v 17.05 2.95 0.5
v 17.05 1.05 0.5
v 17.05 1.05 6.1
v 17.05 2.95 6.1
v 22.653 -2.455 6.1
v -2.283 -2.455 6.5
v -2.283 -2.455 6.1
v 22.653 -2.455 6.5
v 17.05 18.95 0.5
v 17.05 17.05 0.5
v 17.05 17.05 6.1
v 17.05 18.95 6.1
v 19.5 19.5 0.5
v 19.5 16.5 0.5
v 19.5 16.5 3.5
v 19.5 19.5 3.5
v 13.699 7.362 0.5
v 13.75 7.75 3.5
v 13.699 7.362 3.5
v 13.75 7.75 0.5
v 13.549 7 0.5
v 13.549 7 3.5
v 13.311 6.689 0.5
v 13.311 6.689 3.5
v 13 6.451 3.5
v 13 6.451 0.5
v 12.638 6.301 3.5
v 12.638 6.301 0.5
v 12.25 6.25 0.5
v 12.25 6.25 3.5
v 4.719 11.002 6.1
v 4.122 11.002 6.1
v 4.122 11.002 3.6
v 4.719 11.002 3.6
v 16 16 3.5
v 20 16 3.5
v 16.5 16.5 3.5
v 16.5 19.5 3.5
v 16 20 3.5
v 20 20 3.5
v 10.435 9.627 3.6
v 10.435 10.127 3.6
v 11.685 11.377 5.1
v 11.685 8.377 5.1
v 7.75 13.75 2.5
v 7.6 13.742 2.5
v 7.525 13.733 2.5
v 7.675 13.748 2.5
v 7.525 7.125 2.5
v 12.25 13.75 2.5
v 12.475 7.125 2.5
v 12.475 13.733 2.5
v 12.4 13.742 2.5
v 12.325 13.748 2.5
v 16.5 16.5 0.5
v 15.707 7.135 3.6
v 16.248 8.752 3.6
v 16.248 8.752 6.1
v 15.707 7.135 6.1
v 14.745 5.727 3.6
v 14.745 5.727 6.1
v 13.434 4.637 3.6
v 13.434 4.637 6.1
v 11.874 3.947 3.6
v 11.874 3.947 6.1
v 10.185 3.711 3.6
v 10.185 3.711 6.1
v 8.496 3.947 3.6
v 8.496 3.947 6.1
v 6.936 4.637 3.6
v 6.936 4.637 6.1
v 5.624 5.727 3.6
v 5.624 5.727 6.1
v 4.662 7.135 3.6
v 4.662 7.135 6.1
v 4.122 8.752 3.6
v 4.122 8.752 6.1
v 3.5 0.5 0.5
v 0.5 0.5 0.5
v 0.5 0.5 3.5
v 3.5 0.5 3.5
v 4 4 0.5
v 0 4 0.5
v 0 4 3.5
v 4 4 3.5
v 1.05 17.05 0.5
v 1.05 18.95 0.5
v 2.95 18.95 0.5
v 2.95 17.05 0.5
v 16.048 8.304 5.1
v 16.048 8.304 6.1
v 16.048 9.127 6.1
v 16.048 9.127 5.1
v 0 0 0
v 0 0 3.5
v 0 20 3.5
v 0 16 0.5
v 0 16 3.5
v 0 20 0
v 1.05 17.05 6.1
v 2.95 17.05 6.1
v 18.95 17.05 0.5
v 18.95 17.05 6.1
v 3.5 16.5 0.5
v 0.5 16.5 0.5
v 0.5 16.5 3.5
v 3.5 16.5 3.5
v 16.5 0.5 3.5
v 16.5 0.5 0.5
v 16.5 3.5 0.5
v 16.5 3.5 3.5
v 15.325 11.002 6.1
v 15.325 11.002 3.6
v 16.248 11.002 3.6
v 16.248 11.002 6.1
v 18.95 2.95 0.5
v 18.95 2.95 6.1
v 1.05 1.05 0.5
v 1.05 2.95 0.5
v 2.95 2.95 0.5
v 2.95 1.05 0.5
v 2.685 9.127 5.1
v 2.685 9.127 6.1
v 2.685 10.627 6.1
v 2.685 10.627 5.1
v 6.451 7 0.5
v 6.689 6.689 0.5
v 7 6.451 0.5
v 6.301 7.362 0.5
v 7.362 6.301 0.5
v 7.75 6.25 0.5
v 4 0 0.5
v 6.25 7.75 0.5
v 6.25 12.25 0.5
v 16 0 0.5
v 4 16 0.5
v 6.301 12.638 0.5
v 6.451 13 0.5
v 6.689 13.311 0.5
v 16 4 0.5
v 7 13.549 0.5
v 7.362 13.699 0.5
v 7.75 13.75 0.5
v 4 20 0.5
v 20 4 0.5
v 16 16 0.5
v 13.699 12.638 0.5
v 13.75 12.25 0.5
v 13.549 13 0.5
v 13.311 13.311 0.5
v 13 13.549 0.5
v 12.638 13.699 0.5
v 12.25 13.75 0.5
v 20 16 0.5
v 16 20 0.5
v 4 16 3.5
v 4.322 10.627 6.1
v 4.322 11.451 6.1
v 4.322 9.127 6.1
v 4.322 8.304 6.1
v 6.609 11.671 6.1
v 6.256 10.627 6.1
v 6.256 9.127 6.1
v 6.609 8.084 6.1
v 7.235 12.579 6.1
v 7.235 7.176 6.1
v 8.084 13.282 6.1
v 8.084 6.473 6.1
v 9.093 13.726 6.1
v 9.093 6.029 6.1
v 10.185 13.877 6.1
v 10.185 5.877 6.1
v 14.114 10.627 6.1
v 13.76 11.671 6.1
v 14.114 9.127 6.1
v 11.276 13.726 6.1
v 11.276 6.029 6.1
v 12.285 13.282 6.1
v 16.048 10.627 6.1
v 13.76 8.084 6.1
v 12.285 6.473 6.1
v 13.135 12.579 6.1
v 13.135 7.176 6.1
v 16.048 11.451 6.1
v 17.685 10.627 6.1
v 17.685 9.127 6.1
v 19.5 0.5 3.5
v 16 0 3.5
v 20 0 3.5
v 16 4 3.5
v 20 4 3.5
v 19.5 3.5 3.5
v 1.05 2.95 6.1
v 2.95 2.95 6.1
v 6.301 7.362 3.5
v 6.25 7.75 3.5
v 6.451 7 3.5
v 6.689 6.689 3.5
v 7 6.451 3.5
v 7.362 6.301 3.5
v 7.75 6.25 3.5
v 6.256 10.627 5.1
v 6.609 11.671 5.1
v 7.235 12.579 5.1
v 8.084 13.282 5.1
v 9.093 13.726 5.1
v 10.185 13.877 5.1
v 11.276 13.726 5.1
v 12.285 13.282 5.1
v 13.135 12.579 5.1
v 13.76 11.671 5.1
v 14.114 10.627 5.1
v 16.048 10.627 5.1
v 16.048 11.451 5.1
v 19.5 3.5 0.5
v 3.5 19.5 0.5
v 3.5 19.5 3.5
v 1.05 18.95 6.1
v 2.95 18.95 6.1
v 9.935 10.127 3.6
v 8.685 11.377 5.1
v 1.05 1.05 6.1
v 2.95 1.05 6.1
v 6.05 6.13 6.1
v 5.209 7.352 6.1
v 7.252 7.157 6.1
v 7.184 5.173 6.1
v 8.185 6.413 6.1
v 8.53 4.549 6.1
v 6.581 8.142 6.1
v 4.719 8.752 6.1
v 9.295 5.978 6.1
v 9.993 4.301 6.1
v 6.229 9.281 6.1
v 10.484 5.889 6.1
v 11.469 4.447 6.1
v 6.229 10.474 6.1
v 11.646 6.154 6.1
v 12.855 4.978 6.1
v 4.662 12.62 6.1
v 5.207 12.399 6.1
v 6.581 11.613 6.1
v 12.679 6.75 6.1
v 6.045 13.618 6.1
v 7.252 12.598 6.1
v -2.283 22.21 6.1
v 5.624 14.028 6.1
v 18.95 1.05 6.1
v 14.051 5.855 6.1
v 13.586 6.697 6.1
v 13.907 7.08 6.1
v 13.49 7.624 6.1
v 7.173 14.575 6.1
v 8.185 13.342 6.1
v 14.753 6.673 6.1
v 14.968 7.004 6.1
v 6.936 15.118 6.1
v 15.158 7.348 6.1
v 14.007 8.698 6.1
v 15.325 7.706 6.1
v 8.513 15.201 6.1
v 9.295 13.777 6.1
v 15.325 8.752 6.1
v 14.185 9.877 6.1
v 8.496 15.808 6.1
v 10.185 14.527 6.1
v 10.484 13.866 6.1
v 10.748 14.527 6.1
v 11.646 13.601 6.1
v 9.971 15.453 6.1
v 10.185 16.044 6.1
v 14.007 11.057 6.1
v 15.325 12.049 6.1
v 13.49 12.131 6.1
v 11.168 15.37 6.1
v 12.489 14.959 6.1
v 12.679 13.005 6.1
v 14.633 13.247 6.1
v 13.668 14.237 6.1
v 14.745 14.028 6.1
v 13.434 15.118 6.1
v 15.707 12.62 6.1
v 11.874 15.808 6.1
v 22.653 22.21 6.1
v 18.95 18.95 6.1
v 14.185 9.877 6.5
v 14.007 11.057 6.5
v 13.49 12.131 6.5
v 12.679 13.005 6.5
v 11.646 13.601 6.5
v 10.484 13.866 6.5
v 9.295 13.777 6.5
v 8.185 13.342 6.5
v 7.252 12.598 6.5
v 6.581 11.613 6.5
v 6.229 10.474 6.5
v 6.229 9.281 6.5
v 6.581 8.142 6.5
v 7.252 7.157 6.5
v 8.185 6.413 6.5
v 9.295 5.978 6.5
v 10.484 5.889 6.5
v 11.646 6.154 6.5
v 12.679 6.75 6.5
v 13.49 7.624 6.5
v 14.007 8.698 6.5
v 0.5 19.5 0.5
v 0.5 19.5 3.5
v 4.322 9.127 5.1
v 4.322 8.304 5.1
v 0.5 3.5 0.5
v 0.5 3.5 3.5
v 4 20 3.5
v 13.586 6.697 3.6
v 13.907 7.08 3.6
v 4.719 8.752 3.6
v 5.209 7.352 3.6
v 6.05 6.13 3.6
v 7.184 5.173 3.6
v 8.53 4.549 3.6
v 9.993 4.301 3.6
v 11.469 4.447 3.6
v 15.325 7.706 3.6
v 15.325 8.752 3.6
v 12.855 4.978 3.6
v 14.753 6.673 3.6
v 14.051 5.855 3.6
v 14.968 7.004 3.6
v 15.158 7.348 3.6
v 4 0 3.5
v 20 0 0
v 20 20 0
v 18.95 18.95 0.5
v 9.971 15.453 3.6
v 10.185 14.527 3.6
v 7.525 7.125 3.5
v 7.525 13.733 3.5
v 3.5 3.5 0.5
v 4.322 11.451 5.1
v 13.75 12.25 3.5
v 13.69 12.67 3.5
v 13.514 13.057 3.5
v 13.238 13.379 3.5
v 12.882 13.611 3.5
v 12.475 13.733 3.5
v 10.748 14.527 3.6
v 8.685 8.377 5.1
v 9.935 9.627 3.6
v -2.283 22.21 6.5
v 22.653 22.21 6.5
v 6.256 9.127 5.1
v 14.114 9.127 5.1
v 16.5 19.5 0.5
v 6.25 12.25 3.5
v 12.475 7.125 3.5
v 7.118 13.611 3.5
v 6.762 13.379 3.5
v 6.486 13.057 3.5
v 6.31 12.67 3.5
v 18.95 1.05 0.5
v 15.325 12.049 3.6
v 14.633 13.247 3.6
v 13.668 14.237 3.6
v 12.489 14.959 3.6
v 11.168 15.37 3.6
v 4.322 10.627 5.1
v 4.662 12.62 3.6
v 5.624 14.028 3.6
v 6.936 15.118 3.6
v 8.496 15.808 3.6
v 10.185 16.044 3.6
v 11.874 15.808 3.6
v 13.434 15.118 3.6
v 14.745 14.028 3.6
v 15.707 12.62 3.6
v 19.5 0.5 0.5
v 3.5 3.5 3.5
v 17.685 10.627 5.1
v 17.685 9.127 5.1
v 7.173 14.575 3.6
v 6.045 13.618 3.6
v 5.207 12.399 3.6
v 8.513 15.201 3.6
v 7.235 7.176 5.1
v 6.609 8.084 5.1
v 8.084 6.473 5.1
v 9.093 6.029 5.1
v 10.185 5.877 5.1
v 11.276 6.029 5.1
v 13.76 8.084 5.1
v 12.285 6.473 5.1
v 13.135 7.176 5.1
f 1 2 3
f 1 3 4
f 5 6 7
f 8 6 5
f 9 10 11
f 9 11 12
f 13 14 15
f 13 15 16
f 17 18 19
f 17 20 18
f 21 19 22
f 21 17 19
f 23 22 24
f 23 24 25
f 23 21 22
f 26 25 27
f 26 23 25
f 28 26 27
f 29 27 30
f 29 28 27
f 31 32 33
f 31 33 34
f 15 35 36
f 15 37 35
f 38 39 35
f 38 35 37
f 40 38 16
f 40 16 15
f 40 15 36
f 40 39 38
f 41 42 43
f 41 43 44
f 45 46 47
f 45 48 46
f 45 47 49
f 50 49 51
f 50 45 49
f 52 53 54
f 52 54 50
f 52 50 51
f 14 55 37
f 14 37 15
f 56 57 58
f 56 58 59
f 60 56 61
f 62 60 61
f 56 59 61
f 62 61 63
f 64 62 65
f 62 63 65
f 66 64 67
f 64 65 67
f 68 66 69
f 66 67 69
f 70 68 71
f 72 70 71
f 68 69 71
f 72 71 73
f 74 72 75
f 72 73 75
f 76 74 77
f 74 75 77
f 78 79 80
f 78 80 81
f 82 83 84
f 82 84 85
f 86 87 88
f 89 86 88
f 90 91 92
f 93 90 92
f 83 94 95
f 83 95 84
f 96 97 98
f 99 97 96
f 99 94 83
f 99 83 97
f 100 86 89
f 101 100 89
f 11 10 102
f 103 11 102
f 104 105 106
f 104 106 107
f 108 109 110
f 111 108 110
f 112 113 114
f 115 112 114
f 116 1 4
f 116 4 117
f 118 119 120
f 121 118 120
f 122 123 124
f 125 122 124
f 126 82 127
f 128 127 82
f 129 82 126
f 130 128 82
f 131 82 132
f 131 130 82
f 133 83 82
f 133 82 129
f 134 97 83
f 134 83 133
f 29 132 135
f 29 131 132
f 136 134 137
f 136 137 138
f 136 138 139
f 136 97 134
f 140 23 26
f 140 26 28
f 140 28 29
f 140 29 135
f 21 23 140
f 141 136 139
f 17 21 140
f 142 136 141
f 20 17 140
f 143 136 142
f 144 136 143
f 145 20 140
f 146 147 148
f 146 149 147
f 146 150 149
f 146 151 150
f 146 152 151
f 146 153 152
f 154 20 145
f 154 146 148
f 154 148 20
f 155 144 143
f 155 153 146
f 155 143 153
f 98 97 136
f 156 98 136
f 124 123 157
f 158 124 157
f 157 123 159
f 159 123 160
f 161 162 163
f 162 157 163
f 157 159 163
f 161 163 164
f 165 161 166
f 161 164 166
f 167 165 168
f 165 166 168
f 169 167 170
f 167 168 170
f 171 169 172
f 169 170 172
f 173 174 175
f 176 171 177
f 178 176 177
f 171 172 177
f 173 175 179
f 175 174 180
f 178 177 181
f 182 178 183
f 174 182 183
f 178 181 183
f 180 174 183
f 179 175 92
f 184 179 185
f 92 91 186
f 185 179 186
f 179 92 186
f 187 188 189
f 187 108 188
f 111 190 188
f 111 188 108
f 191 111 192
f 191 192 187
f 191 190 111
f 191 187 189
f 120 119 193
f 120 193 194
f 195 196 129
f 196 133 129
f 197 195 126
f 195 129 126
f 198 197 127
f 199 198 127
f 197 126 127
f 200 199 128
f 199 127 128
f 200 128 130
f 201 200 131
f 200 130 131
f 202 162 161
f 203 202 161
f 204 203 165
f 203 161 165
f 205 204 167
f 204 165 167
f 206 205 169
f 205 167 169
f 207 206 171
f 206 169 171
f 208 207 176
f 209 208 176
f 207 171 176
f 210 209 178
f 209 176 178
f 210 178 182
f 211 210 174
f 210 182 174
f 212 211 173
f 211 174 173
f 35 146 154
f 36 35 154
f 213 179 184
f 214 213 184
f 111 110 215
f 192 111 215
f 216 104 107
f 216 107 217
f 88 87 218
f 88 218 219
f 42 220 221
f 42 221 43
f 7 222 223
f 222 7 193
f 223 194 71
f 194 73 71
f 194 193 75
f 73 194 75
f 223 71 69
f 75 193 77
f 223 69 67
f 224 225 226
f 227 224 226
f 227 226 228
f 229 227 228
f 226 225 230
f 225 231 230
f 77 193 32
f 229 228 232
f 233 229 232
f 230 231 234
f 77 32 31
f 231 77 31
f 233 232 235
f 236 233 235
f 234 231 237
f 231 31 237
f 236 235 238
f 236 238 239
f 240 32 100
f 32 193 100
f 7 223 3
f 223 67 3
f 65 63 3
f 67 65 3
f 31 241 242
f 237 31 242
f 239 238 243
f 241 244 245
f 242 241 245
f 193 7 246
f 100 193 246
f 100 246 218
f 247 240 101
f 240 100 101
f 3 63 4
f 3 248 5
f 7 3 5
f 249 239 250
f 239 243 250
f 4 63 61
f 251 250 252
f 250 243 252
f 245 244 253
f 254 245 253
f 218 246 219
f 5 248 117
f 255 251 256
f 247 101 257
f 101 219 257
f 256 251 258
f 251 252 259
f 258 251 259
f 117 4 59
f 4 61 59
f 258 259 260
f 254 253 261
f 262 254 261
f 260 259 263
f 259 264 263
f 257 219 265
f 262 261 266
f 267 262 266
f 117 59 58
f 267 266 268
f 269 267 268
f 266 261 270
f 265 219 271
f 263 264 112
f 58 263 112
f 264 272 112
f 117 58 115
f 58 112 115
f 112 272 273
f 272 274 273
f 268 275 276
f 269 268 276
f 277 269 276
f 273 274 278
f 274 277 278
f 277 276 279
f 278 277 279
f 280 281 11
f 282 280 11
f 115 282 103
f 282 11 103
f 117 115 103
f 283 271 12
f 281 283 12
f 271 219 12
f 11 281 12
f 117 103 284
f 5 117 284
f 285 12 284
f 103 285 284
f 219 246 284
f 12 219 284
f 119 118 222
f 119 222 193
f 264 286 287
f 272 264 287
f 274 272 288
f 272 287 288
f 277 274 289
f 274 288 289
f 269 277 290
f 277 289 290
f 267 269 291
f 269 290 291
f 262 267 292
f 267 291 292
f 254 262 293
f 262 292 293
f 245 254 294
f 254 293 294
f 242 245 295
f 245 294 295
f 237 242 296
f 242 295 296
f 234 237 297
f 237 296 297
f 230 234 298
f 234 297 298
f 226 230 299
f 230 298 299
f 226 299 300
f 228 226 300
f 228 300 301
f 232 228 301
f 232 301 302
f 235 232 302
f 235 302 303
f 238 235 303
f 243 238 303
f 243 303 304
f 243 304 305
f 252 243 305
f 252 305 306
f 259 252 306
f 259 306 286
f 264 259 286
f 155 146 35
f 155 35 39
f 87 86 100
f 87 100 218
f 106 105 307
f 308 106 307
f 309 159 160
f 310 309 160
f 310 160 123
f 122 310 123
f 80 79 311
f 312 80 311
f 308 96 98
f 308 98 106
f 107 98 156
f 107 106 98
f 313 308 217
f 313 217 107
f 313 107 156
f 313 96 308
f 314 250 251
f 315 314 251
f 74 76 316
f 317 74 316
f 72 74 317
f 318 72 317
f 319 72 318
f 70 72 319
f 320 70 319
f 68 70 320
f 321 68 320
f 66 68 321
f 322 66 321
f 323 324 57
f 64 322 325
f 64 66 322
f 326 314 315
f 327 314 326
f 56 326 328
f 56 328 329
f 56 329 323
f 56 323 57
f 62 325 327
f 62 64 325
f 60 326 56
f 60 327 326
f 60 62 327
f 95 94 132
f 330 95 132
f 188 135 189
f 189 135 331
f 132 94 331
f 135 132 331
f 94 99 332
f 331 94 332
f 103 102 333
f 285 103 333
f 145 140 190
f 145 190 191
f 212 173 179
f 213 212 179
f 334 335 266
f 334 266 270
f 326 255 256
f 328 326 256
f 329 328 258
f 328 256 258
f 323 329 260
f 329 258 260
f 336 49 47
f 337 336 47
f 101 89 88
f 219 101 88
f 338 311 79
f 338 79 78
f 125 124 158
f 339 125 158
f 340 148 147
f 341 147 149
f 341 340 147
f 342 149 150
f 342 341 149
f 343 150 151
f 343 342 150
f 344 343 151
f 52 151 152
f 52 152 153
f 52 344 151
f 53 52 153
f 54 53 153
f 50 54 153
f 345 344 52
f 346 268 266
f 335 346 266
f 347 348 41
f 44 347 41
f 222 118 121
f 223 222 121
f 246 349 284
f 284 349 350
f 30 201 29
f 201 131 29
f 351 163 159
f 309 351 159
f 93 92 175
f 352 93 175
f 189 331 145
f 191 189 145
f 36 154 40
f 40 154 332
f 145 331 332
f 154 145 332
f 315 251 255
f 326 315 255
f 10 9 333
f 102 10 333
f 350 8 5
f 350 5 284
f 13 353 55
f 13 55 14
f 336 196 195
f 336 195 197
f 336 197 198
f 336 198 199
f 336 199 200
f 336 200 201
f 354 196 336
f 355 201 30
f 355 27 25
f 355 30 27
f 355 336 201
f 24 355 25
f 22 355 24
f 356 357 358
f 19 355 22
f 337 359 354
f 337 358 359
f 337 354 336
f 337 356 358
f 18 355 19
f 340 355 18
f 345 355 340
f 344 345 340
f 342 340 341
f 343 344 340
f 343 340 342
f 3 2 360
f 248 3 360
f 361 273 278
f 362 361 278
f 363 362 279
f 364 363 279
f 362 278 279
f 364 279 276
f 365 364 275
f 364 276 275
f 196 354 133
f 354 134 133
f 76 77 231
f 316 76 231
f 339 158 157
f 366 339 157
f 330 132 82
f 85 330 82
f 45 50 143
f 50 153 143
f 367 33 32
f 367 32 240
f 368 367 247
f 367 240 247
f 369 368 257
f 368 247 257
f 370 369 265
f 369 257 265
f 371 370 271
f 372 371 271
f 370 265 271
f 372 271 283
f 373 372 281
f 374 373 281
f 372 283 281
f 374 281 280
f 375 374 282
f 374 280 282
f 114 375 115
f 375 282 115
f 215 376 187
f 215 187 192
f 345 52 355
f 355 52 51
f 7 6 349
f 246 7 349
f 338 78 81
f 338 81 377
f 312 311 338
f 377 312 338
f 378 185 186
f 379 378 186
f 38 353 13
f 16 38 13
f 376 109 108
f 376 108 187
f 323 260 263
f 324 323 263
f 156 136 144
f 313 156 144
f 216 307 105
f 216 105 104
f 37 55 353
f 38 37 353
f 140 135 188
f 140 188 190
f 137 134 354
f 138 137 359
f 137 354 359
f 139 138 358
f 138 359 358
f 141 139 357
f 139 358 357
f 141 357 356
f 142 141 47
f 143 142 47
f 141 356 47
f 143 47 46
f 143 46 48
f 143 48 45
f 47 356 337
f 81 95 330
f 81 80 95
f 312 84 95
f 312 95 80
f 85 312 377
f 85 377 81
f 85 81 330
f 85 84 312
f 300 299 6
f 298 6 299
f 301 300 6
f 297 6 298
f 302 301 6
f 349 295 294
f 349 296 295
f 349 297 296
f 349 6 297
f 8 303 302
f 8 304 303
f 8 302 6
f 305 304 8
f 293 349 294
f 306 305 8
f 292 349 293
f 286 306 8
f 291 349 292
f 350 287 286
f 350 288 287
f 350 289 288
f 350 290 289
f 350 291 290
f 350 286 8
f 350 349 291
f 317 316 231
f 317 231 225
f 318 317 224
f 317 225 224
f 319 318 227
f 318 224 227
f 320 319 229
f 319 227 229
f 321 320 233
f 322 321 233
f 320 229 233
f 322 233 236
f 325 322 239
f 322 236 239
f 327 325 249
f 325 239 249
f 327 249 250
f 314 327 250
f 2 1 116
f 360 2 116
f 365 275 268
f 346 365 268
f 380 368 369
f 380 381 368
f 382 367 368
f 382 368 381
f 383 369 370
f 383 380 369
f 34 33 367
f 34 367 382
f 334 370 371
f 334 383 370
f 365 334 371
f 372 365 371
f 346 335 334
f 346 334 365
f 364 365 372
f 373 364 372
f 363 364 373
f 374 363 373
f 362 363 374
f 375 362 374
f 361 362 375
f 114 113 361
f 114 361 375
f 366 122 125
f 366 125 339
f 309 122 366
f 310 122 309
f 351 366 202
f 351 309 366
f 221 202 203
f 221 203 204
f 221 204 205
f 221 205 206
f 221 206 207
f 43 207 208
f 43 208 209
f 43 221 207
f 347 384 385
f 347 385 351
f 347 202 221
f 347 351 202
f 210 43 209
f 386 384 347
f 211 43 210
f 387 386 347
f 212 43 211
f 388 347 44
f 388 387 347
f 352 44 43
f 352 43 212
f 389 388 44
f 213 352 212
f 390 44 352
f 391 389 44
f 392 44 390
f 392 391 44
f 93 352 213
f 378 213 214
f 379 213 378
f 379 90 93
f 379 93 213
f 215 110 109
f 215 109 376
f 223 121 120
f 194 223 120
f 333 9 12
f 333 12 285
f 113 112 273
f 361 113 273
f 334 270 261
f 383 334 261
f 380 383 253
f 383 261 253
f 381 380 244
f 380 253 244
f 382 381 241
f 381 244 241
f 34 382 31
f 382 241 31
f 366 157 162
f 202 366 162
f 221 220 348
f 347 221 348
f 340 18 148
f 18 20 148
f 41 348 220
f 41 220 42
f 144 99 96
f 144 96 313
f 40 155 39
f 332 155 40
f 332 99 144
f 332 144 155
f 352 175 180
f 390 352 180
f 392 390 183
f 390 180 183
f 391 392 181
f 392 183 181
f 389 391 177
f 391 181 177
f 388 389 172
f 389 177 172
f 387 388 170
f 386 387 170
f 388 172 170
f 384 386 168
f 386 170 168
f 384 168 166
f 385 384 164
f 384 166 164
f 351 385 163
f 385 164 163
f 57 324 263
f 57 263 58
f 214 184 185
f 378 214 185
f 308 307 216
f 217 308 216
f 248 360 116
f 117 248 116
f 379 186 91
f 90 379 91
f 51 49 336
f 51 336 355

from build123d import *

# Parameters (mm, degrees)
F0_W      = 20
F0_H      = 20
F1_DEPTH  = 0.5
F2_W      = 4
F2_H      = 4
F2_W_2    = 3
F2_H_2    = 3
F3_DEPTH  = 3
F2_W_3    = 1.9
F2_H_3    = 1.9
F4_DEPTH  = 6
F5_W      = 24.9357379507
F5_H      = 24.6656327508
F5_W_2    = 1.9
F5_H_2    = 1.9
F6_DEPTH  = 0.4
F7_R      = 4
F8_DEPTH  = 25
F9_R      = 6.1663142181
F10_DEPTH = 2.5
F11_W     = 7.5
F11_H     = 7.5
F12_DEPTH = 2
F13_W     = 4.95
F13_H     = 0.875
F14_DEPTH = 1
F15_R     = 1.5
F16_W     = 15
F16_H     = 2.25
F17_DEPTH = 2.5
F18_W     = 1.6371783766
F18_H     = 0.75
F19_DEPTH = 1
F20_W     = 3
F20_H     = 3
F21_DEPTH = 1.5
F22_SIZE2 = 1.24999
F22_SIZE  = 1.49999


# Not quite as in the source:
# - a fillet or chamfer is up to 0.001 mm smaller than in the source, because OpenCascade refuses the exact size
# - a feature names something its author has since deleted; it is built from what else it names


with BuildPart() as f1:
    # F0 (on Top) → F1 (new body)
    with BuildSketch(Plane.XY):
        with Locations((10, 10)):
            Rectangle(F0_W, F0_H)
    extrude(amount=F1_DEPTH)

    # F2 (on face) → F3 (join)
    with BuildSketch(Plane.XY.offset(0.5)):
        with Locations((18, 18)):
            Rectangle(F2_W, F2_H)
        with Locations((18, 18)):
            Rectangle(F2_W_2, F2_H_2, mode=Mode.SUBTRACT)
        with Locations((2, 18)):
            Rectangle(F2_W, F2_H)
        with Locations((2, 18)):
            Rectangle(F2_W_2, F2_H_2, mode=Mode.SUBTRACT)
        with Locations((2, 2)):
            Rectangle(F2_W, F2_H)
        with Locations((2, 2)):
            Rectangle(F2_W_2, F2_H_2, mode=Mode.SUBTRACT)
        with Locations((18, 2)):
            Rectangle(F2_W, F2_H)
        with Locations((18, 2)):
            Rectangle(F2_W_2, F2_H_2, mode=Mode.SUBTRACT)
    extrude(amount=F3_DEPTH)

    # F11 (on face) → F12 (join)
    with BuildSketch(Plane.XY.offset(0.5)):
        with Locations((10, 10)):
            Rectangle(F11_W, F11_H)
    extrude(amount=F12_DEPTH)

    # F13 (on face) → F14 (join)
    with BuildSketch(Plane.XY.offset(2.5)):
        Polygon((12.475, 7.125), (12.475, 6.25), (13.75, 6.25), (13.75, 13.75), (12.475, 13.75), align=None)
        with Locations((10, 6.6875)):
            Rectangle(F13_W, F13_H)
        Polygon((6.25, 6.25), (7.525, 6.25), (7.525, 7.125), (7.525, 13.75), (6.25, 13.75), align=None)
    extrude(amount=F14_DEPTH)

    # F15
    f15_edges = [f1.edges().sort_by_distance(p)[0] for p in [
        (6.25, 13.75, 2),
        (13.75, 13.75, 2),
        (13.75, 6.25, 2),
        (6.25, 6.25, 2),
    ]]
    fillet(f15_edges, radius=F15_R)


with BuildPart() as f4:
    # F2 (on face) → F4 (new body)
    with BuildSketch(Plane.XY.offset(0.5)):
        with Locations((2, 18)):
            Rectangle(F2_W_3, F2_H_3)
    extrude(amount=F4_DEPTH)



with BuildPart() as f4b:
    # F2 (on face) → F4, piece 2 (new body)
    with BuildSketch(Plane.XY.offset(0.5)):
        with Locations((18, 18)):
            Rectangle(F2_W_3, F2_H_3)
    extrude(amount=F4_DEPTH)


with BuildPart() as f4c:
    # F2 (on face) → F4, piece 3 (new body)
    with BuildSketch(Plane.XY.offset(0.5)):
        with Locations((18, 2)):
            Rectangle(F2_W_3, F2_H_3)
    extrude(amount=F4_DEPTH)


with BuildPart() as f4d:
    # F2 (on face) → F4, piece 4 (new body)
    with BuildSketch(Plane.XY.offset(0.5)):
        with Locations((2, 2)):
            Rectangle(F2_W_3, F2_H_3)
    extrude(amount=F4_DEPTH)


with BuildPart() as f4_1:
    add(f4.part)

    add(f4b.part)  # F6 merges F4b

    add(f4c.part)  # F6 merges F4c

    add(f4d.part)  # F6 merges F4d
    # F5 (on face) → F6 (join)
    with BuildSketch(Plane.XY.offset(6.5)):
        with Locations((10.1846862817, 9.8774891812)):
            Rectangle(F5_W, F5_H)
        with Locations((18, 18)):
            Rectangle(F5_W_2, F5_H_2, mode=Mode.SUBTRACT)
    extrude(amount=-F6_DEPTH)

    # F7 (on face) → F8 (cut)
    with BuildSketch(Plane.XY.offset(6.5)):
        with Locations((10.1846862817, 9.8774891812)):
            Circle(F7_R)
    extrude(amount=-F8_DEPTH, mode=Mode.SUBTRACT)

    # F9 (on face) → F10 (join)
    with BuildSketch(Plane(origin=(0, 0, 6.1), x_dir=(1, 0, 0), z_dir=(0, 0, -1))):
        with Locations((10.1846862817, -9.8774891812)):
            Circle(F9_R)
        with BuildLine():
            ThreePointArc((11.1682663292, -15.369970548), (10.571768696, -15.4439017135), (9.970779517, -15.4532425089))
            ThreePointArc((9.970779517, -15.4532425089), (5.0496141216, -7.6944144723), (14.0514253314, -5.8546654968))
            ThreePointArc((14.0514253314, -5.8546654968), (14.4219337589, -6.2469912689), (14.7528122455, -6.6732722014))
            ThreePointArc((14.7528122455, -6.6732722014), (15.066029035, -7.1742921482), (15.3245095344, -7.7056240368))
            ThreePointArc((15.3245095344, -7.7056240368), (15.6534269731, -8.7694925543), (15.7645412327, -9.8774891812))
            ThreePointArc((15.7645412327, -9.8774891812), (15.6534269731, -10.9854858082), (15.3245095344, -12.0493543256))
            ThreePointArc((15.3245095344, -12.0493543256), (13.6675931163, -14.2368631336), (11.1682663292, -15.369970548))
        make_face(mode=Mode.SUBTRACT)
        with BuildLine():
            ThreePointArc((15.7645412327, -9.8774891812), (15.6534269731, -8.7694925543), (15.3245095344, -7.7056240368))
            Line((15.3245095344, -7.7056240368), (15.3245095344, -12.0493543256))
            ThreePointArc((15.3245095344, -12.0493543256), (15.6534269731, -10.9854858082), (15.7645412327, -9.8774891812))
        make_face()
        with BuildLine():
            Line((10.7477184775, -14.5274891812), (10.1846862817, -14.5274891812))
            Line((10.1846862817, -14.5274891812), (9.970779517, -15.4532425089))
            ThreePointArc((9.970779517, -15.4532425089), (10.571768696, -15.4439017135), (11.1682663292, -15.369970548))
            Line((11.1682663292, -15.369970548), (10.7477184775, -14.5274891812))
        make_face()
        with BuildLine():
            Line((13.5860960398, -6.6970156854), (13.7467929422, -6.8885267962))
            Line((13.7467929422, -6.8885267962), (13.9074898446, -7.080037907))
            Line((13.9074898446, -7.080037907), (14.7528122455, -6.6732722014))
            ThreePointArc((14.7528122455, -6.6732722014), (14.4219337589, -6.2469912689), (14.0514253314, -5.8546654968))
            Line((14.0514253314, -5.8546654968), (13.5860960398, -6.6970156854))
        make_face()
    extrude(amount=F10_DEPTH)

    # F16 (on face) → F17 (cut, through all)
    with BuildSketch(Plane(origin=(0, 0, 3.6), x_dir=(1, 0, 0), z_dir=(0, 0, -1))):
        with Locations((10.1846862817, -9.8774891812)):
            Rectangle(F16_W, F16_H)
    extrude(amount=-F17_DEPTH, mode=Mode.SUBTRACT)


with BuildPart() as f19:
    # F18 (on face) → F19 (new body)
    with BuildSketch(Plane(origin=(0, 0, 6.1), x_dir=(1, 0, 0), z_dir=(0, 0, -1))):
        with BuildLine():
            Line((10.1846862817, -9.8774891812), (14.1846862817, -9.8774891812))
            ThreePointArc((14.1846862817, -9.8774891812), (14.1669113912, -9.5008153472), (14.1137446931, -9.1274891812))
            Line((14.1137446931, -9.1274891812), (6.2556278703, -9.1274891812))
            ThreePointArc((6.2556278703, -9.1274891812), (6.2024611722, -9.5008153472), (6.1846862817, -9.8774891812))
            Line((6.1846862817, -9.8774891812), (10.1846862817, -9.8774891812))
        make_face()
        with BuildLine():
            Line((16.0475079051, -9.8774891812), (14.1846862817, -9.8774891812))
            ThreePointArc((14.1846862817, -9.8774891812), (14.1669113912, -10.2541630153), (14.1137446931, -10.6274891812))
            Line((14.1137446931, -10.6274891812), (16.0475079051, -10.6274891812))
            Line((16.0475079051, -10.6274891812), (16.0475079051, -9.8774891812))
        make_face()
        with BuildLine():
            ThreePointArc((14.1137446931, -10.6274891812), (14.1669113912, -10.2541630153), (14.1846862817, -9.8774891812))
            Line((14.1846862817, -9.8774891812), (10.1846862817, -9.8774891812))
            Line((10.1846862817, -9.8774891812), (6.1846862817, -9.8774891812))
            ThreePointArc((6.1846862817, -9.8774891812), (6.2024611722, -10.2541630153), (6.2556278703, -10.6274891812))
            Line((6.2556278703, -10.6274891812), (14.1137446931, -10.6274891812))
        make_face()
        with BuildLine():
            ThreePointArc((14.1137446931, -9.1274891812), (14.1669113912, -9.5008153472), (14.1846862817, -9.8774891812))
            Line((14.1846862817, -9.8774891812), (16.0475079051, -9.8774891812))
            Line((16.0475079051, -9.8774891812), (16.0475079051, -9.1274891812))
            Line((16.0475079051, -9.1274891812), (14.1137446931, -9.1274891812))
        make_face()
        with BuildLine():
            Line((6.2556278703, -9.1274891812), (14.1137446931, -9.1274891812))
            ThreePointArc((14.1137446931, -9.1274891812), (10.1846862817, -5.8774891812), (6.2556278703, -9.1274891812))
        make_face()
        with BuildLine():
            ThreePointArc((6.2556278703, -10.6274891812), (10.1846862817, -13.8774891812), (14.1137446931, -10.6274891812))
            Line((14.1137446931, -10.6274891812), (6.2556278703, -10.6274891812))
        make_face()
        with Locations((16.8660970934, -9.5024891812)):
            Rectangle(F18_W, F18_H)
        with Locations((16.8660970934, -10.2524891812)):
            Rectangle(F18_W, F18_H)
        with BuildLine():
            ThreePointArc((6.1846862817, -9.8774891812), (6.2024611722, -9.5008153472), (6.2556278703, -9.1274891812))
            Line((6.2556278703, -9.1274891812), (4.3218646583, -9.1274891812))
            Line((4.3218646583, -9.1274891812), (4.3218646583, -9.8774891812))
            Line((4.3218646583, -9.8774891812), (6.1846862817, -9.8774891812))
        make_face()
        Polygon((16.0475079051, -8.3041858837), (16.0475079051, -9.1274891812), (17.6846862817, -9.1274891812), align=None)
        with BuildLine():
            Line((4.3218646583, -10.6274891812), (6.2556278703, -10.6274891812))
            ThreePointArc((6.2556278703, -10.6274891812), (6.2024611722, -10.2541630153), (6.1846862817, -9.8774891812))
            Line((6.1846862817, -9.8774891812), (4.3218646583, -9.8774891812))
            Line((4.3218646583, -9.8774891812), (4.3218646583, -10.6274891812))
        make_face()
        Polygon((17.6846862817, -10.6274891812), (16.0475079051, -10.6274891812), (16.0475079051, -11.4507924787), align=None)
        with Locations((3.50327547, -9.5024891812)):
            Rectangle(F18_W, F18_H)
        Polygon((2.6846862817, -9.1274891812), (4.3218646583, -9.1274891812), (4.3218646583, -8.3041858837), align=None)
        Polygon((4.3218646583, -11.4507924787), (4.3218646583, -10.6274891812), (2.6846862817, -10.6274891812), align=None)
        with Locations((3.50327547, -10.2524891812)):
            Rectangle(F18_W, F18_H)
    extrude(amount=F19_DEPTH)

    # F20 (on face) → F21 (join)
    with BuildSketch(Plane(origin=(0, 0, 5.1), x_dir=(1, 0, 0), z_dir=(0, 0, -1))):
        with Locations((10.1846862817, -9.8774891812)):
            Rectangle(F20_W, F20_H)
    extrude(amount=F21_DEPTH)

    # F22 (size 1.5 and 1.25 in the source; OpenCascade refuses exactly that, so slightly less here)
    f22_edges = [f19.edges().sort_by_distance(p)[0] for p in [
        (10.184686, 8.377489, 3.6),
        (8.684686, 9.877489, 3.6),
        (10.184686, 11.377489, 3.6),
        (11.684686, 9.877489, 3.6),
    ]]
    chamfer(f22_edges, length=F22_SIZE, length2=F22_SIZE2)


solid = Compound([f1.part, f4_1.part, f19.part])
